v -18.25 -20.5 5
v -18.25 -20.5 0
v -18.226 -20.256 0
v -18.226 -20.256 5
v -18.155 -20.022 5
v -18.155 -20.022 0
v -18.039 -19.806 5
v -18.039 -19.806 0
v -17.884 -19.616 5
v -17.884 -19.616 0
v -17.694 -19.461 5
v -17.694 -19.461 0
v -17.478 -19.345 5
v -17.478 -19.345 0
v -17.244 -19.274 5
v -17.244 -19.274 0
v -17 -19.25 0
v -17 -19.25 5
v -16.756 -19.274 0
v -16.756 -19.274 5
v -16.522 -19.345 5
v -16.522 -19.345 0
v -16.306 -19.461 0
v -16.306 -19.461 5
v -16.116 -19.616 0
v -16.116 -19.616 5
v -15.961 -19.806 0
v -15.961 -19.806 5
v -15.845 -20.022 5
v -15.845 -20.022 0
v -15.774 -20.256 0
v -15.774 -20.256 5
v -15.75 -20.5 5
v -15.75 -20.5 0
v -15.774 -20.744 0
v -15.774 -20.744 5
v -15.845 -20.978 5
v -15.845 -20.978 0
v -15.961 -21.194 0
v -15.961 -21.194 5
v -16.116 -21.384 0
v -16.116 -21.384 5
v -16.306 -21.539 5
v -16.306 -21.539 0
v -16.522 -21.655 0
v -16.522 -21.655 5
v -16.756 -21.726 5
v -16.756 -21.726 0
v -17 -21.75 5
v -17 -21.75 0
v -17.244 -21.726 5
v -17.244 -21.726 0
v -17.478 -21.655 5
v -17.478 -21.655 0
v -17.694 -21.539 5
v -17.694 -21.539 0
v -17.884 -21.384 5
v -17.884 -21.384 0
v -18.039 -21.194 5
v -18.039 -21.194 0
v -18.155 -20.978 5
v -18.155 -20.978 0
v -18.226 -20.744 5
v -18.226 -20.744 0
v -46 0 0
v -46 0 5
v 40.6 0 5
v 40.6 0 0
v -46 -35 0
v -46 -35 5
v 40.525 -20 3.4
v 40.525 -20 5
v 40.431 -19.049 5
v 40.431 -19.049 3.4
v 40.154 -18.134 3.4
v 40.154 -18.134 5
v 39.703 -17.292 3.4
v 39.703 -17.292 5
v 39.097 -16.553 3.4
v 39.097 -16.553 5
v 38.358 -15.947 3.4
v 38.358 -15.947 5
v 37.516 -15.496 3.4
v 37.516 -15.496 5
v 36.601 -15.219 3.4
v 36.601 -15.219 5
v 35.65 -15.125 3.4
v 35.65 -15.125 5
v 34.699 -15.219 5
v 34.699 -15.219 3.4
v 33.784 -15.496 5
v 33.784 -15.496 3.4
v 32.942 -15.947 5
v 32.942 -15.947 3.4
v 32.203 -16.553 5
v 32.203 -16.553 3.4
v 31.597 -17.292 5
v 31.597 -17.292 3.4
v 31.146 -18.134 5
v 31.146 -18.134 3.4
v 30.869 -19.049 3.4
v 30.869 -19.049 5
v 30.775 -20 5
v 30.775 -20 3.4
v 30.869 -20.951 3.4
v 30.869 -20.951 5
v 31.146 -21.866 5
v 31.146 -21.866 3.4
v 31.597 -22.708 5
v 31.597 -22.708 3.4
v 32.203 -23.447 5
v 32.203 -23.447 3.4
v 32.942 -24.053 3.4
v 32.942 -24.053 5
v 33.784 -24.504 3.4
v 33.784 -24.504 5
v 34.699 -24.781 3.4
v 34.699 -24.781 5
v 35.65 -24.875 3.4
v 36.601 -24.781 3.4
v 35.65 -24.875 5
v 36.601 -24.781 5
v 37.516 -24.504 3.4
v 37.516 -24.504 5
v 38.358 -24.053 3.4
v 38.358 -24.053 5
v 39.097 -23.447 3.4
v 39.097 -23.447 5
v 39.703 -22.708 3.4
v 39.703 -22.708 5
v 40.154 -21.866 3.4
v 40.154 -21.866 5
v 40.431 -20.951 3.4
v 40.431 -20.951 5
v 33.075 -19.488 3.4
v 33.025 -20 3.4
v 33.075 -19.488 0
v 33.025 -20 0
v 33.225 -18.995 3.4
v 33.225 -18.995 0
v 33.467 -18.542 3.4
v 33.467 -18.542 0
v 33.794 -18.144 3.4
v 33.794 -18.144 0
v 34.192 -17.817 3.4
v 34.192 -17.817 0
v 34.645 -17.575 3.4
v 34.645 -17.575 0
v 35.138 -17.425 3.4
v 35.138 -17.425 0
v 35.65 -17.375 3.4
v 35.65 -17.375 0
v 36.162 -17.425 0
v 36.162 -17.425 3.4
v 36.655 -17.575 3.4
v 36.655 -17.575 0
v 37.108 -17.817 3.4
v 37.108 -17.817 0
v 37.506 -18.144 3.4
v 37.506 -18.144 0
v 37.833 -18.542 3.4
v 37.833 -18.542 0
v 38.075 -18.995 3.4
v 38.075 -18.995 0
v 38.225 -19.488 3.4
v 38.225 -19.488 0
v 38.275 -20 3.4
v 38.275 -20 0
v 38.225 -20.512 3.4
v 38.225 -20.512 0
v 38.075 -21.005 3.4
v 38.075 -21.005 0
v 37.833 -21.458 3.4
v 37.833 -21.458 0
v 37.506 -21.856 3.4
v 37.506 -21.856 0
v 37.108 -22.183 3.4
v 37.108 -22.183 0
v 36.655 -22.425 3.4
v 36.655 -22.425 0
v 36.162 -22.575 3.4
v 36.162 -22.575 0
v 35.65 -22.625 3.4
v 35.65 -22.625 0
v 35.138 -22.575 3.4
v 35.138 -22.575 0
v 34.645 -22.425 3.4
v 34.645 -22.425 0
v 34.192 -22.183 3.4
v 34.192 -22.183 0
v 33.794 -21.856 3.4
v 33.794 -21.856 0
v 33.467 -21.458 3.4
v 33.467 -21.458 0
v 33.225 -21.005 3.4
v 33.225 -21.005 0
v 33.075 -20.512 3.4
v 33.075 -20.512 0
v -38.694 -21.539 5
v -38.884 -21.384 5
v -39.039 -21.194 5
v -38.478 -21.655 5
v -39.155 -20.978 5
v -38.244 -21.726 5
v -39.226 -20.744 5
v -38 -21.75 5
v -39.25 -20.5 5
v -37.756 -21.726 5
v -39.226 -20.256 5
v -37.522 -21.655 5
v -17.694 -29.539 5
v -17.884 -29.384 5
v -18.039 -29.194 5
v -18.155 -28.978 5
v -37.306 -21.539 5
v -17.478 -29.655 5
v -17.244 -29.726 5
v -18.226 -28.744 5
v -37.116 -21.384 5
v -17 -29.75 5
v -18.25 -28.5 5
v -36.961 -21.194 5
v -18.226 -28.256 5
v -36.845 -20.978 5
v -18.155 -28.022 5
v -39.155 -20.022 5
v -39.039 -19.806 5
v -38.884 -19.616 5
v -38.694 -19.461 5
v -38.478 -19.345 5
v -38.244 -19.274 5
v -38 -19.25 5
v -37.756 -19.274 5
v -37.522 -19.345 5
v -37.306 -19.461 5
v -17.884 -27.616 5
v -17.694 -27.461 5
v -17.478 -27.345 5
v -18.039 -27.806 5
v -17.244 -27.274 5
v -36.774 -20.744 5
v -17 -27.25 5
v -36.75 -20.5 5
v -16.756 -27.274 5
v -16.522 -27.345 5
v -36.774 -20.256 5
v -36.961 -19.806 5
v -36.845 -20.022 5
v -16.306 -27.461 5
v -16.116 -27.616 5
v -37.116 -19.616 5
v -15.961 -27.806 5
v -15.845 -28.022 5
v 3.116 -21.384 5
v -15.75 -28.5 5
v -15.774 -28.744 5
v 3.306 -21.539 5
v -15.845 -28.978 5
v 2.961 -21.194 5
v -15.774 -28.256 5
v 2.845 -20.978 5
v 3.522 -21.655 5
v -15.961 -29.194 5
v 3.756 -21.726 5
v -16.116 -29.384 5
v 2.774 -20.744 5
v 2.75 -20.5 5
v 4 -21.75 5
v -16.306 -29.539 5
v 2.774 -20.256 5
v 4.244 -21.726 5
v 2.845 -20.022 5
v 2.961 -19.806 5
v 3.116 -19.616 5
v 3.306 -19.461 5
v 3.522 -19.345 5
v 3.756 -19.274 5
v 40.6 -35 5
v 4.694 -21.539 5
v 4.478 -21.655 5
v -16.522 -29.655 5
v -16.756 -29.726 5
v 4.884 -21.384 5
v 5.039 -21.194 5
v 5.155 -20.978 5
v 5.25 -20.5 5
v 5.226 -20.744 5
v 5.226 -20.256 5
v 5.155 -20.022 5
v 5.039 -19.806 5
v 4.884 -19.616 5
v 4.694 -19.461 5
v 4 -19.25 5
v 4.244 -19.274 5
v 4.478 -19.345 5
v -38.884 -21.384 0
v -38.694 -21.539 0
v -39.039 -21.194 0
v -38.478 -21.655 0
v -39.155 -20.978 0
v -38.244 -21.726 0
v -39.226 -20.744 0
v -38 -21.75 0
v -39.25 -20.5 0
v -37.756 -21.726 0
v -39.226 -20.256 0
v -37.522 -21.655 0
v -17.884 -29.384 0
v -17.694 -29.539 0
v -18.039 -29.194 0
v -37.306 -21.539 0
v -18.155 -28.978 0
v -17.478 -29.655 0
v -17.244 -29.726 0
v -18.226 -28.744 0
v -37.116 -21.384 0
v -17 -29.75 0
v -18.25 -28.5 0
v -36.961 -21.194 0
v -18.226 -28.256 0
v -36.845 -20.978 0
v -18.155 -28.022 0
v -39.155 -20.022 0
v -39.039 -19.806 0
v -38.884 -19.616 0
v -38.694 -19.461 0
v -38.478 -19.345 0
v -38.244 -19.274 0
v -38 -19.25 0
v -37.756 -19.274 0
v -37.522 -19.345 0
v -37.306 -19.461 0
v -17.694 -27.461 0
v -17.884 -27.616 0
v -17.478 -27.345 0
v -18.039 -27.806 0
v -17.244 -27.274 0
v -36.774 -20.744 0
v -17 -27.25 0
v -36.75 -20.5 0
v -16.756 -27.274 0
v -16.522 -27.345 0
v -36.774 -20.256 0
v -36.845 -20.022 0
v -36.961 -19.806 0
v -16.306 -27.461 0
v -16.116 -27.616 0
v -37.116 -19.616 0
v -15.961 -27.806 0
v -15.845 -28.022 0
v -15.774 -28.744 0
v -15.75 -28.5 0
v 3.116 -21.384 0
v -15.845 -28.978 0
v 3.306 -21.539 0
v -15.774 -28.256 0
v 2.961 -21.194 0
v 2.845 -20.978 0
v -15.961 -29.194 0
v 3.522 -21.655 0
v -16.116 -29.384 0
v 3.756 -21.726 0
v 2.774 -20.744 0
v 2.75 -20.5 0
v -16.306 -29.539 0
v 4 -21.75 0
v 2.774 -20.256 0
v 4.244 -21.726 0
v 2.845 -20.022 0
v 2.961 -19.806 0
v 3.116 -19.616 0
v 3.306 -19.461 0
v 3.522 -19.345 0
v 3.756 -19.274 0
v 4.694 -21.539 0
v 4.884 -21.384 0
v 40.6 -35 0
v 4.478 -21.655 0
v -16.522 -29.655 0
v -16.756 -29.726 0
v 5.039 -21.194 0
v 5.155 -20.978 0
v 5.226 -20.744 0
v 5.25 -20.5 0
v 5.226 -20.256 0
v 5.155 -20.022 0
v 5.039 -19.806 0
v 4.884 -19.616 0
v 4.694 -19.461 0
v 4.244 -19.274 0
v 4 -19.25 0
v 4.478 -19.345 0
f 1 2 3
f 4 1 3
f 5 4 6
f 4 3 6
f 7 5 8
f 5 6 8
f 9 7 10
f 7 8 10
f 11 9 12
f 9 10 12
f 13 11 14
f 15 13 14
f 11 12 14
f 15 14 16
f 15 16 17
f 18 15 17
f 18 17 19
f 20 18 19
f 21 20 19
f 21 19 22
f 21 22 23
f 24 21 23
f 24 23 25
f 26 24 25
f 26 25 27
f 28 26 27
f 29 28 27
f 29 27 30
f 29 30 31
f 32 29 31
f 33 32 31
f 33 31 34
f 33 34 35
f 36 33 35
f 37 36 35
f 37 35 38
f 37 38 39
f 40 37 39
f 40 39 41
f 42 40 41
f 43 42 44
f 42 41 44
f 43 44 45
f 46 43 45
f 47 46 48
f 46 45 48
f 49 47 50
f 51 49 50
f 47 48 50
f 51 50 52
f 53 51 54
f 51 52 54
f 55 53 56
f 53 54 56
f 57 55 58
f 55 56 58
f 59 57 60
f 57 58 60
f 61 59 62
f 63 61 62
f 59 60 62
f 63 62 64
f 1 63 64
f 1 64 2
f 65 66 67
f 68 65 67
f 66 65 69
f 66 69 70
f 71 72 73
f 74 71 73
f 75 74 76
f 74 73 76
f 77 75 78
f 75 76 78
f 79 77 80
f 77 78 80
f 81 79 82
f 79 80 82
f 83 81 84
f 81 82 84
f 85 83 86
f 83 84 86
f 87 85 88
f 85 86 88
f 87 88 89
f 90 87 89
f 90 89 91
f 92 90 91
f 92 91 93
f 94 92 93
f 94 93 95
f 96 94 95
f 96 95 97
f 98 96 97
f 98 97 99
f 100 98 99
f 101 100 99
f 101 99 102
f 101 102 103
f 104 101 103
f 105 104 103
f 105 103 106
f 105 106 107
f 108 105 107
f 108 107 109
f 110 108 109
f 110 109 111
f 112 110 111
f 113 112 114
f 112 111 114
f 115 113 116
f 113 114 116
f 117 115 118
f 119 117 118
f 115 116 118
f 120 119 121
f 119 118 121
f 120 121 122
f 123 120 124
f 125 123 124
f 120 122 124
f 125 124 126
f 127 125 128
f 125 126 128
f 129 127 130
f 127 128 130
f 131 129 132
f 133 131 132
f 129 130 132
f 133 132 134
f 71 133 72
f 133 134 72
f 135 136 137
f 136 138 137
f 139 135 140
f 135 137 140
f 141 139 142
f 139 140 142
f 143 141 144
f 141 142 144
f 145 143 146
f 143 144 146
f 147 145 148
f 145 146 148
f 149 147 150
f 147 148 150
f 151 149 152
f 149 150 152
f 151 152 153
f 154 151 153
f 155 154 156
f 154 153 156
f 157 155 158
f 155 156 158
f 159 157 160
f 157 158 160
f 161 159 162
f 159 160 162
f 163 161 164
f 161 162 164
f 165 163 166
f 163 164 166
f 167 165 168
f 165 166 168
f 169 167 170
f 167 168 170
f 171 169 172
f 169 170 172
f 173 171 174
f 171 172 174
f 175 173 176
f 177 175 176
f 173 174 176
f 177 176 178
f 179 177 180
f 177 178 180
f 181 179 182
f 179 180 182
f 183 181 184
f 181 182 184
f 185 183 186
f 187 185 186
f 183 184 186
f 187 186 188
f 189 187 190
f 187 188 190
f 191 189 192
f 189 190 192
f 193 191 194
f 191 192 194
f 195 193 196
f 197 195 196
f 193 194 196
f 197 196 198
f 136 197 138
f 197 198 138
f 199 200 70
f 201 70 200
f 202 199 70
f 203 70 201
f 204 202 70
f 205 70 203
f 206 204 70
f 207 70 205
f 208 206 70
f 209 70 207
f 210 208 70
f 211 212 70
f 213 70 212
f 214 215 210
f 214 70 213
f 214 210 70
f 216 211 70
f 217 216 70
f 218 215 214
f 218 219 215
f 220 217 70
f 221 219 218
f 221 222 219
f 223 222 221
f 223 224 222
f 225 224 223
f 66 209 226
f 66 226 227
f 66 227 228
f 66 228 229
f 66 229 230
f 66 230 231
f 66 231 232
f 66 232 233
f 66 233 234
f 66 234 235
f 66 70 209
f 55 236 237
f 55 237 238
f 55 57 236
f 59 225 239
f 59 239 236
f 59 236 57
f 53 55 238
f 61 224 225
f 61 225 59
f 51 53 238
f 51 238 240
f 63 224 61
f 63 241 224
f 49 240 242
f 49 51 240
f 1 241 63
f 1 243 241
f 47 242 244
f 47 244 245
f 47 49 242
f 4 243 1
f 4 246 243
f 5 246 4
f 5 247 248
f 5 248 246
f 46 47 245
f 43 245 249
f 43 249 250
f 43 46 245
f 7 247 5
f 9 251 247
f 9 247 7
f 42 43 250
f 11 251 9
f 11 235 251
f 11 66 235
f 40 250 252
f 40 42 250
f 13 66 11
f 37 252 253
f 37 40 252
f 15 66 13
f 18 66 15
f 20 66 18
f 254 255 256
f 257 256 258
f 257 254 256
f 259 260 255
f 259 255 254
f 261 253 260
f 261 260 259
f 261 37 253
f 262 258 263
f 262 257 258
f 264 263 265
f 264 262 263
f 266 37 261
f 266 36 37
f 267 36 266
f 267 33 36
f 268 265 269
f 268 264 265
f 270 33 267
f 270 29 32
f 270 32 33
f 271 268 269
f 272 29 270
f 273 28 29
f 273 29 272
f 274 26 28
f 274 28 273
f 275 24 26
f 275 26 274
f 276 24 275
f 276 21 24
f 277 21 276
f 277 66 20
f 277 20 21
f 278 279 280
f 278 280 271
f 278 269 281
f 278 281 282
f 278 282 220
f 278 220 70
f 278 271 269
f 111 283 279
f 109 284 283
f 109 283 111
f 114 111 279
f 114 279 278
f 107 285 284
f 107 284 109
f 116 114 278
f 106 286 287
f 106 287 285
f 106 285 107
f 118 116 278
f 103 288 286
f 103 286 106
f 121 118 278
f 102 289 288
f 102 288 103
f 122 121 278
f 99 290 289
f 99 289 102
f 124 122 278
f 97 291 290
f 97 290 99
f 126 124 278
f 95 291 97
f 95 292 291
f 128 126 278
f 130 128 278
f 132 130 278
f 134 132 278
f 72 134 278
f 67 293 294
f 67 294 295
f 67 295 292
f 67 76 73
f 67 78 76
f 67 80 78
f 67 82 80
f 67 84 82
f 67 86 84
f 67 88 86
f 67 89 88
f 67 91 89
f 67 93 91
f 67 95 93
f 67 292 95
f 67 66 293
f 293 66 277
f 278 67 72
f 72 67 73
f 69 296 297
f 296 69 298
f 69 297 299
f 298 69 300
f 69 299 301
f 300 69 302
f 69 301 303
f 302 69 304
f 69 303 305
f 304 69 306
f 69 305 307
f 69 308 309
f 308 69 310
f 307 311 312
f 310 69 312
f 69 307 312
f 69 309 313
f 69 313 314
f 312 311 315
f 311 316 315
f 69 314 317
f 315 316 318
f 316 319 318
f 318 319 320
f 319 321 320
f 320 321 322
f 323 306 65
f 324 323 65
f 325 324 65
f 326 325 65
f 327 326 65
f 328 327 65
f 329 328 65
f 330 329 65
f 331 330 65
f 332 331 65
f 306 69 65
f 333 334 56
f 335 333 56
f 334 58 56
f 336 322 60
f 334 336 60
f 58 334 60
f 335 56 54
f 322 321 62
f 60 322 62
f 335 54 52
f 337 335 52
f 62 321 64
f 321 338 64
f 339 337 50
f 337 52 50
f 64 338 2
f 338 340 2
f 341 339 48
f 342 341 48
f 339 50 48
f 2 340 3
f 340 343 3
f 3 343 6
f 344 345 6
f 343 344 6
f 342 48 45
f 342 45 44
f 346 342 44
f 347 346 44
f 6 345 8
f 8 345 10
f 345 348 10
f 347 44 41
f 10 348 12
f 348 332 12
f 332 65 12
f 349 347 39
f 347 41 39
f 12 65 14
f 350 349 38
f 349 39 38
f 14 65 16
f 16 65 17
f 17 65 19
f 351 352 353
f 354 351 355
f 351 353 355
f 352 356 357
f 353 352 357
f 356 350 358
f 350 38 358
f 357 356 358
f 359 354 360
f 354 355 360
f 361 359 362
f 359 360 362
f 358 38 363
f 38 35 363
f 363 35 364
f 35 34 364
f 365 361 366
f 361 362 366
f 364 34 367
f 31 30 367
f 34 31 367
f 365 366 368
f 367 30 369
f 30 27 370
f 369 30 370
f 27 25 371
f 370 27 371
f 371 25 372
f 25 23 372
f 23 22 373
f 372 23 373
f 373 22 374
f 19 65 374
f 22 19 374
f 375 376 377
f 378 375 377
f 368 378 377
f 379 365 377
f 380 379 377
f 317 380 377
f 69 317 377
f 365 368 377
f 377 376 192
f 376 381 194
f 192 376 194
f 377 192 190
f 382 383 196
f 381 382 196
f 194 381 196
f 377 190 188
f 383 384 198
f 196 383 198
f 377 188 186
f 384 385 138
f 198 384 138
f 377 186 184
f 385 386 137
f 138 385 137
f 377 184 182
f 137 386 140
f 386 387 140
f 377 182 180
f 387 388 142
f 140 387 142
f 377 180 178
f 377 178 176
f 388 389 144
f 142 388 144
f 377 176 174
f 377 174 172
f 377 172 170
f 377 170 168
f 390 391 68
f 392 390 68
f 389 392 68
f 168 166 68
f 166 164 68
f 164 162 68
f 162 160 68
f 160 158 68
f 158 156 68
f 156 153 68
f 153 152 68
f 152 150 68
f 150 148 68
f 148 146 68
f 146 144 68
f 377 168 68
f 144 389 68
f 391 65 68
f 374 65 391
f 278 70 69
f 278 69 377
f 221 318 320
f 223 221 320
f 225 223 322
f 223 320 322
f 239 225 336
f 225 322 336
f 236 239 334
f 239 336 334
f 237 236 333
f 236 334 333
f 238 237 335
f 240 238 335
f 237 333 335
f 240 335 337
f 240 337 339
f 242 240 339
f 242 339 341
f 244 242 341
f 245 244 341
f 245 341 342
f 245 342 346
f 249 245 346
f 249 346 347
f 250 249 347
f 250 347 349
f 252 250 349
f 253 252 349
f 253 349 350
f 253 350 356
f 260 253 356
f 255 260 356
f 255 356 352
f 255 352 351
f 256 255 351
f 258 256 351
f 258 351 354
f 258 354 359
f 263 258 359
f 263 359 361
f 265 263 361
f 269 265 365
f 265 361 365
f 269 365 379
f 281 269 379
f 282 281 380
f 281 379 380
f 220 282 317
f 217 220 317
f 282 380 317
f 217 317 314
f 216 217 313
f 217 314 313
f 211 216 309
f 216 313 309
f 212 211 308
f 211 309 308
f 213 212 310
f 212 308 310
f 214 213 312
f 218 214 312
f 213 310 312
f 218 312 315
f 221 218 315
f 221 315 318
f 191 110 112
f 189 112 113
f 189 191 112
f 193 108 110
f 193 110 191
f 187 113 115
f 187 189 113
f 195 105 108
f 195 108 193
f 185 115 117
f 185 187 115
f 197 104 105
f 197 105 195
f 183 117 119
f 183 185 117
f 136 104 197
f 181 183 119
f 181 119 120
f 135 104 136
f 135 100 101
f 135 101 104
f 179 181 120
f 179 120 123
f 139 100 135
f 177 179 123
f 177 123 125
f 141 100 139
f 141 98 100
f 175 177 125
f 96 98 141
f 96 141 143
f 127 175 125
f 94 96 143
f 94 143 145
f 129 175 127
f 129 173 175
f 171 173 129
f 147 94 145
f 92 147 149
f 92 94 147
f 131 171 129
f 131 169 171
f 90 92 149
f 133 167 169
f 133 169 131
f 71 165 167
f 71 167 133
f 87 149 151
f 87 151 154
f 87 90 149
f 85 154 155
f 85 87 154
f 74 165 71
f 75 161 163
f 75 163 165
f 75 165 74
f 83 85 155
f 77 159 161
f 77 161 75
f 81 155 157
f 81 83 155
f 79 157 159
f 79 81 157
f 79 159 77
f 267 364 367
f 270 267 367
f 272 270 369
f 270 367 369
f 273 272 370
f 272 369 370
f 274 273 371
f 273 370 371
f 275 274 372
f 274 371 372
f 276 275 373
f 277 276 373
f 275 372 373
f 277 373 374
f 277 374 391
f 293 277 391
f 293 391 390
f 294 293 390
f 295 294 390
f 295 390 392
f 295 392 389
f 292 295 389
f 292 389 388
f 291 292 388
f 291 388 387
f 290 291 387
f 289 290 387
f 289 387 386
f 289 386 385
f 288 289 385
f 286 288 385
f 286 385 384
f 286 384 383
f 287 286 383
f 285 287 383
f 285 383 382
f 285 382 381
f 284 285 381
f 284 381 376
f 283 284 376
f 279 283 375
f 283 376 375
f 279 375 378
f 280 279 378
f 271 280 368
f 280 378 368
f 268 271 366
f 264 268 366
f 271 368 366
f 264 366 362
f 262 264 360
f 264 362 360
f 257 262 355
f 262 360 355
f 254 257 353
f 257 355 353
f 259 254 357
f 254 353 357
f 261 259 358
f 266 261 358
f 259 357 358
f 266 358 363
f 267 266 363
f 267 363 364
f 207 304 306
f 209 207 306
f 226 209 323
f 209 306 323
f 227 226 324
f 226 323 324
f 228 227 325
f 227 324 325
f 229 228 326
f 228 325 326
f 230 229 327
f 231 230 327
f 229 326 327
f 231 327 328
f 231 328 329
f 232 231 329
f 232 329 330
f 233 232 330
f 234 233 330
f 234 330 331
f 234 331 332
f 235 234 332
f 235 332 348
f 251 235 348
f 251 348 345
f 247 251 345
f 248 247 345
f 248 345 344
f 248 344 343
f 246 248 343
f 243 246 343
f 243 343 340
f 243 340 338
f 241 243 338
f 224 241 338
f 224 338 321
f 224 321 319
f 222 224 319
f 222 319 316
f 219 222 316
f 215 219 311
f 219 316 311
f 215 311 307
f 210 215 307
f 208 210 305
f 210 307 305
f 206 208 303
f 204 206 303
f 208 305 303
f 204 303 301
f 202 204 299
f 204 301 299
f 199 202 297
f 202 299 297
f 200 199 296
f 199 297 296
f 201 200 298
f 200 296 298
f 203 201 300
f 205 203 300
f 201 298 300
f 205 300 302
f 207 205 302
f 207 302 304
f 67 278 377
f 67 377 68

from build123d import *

# Parameters (mm, degrees)
F0_W           = 92
F0_H           = 5
F1_DEPTH       = 35
F3_D           = 5.25
F3_DEPTH       = 5
F3_CBORE_D     = 9.75
F3_CBORE_DEPTH = 1.6
F3_TIP         = 1.5772591249
F4_D           = 2.5
F4_DEPTH       = 13.5
F4_TIP         = 0.7510757738
F2_W           = 5.4
F2_H           = 35
F5_DEPTH       = 5


with BuildPart() as f1:
    # F0 (on Front) → F1 (new body)
    with BuildSketch(Plane.XZ):
        with Locations((0, 2.5)):
            Rectangle(F0_W, F0_H)
    extrude(amount=F1_DEPTH)

    # F3
    with Locations(Plane.XY.offset(5)):
        with Locations((35.65, -20)):
            CounterBoreHole(F3_D / 2, F3_CBORE_D / 2, F3_CBORE_DEPTH, depth=F3_DEPTH)
            with Locations((0, 0, -(F3_DEPTH + F3_TIP / 2))):  # 118° drill point
                Cone(0, F3_D / 2, F3_TIP, mode=Mode.SUBTRACT)

    # F4
    with Locations(Plane.XY.offset(5)):
        with Locations((-38, -20.5), (-17, -20.5), (4, -20.5), (-17, -28.5)):
            Hole(F4_D / 2, depth=F4_DEPTH)
            with Locations((0, 0, -(F4_DEPTH + F4_TIP / 2))):  # 118° drill point
                Cone(0, F4_D / 2, F4_TIP, mode=Mode.SUBTRACT)

    # F2 (on face) → F5 (cut)
    with BuildSketch(Plane.XY.offset(5)):
        with Locations((43.3, -17.5)):
            Rectangle(F2_W, F2_H)
    extrude(amount=-F5_DEPTH, mode=Mode.SUBTRACT)


solid = f1.part
